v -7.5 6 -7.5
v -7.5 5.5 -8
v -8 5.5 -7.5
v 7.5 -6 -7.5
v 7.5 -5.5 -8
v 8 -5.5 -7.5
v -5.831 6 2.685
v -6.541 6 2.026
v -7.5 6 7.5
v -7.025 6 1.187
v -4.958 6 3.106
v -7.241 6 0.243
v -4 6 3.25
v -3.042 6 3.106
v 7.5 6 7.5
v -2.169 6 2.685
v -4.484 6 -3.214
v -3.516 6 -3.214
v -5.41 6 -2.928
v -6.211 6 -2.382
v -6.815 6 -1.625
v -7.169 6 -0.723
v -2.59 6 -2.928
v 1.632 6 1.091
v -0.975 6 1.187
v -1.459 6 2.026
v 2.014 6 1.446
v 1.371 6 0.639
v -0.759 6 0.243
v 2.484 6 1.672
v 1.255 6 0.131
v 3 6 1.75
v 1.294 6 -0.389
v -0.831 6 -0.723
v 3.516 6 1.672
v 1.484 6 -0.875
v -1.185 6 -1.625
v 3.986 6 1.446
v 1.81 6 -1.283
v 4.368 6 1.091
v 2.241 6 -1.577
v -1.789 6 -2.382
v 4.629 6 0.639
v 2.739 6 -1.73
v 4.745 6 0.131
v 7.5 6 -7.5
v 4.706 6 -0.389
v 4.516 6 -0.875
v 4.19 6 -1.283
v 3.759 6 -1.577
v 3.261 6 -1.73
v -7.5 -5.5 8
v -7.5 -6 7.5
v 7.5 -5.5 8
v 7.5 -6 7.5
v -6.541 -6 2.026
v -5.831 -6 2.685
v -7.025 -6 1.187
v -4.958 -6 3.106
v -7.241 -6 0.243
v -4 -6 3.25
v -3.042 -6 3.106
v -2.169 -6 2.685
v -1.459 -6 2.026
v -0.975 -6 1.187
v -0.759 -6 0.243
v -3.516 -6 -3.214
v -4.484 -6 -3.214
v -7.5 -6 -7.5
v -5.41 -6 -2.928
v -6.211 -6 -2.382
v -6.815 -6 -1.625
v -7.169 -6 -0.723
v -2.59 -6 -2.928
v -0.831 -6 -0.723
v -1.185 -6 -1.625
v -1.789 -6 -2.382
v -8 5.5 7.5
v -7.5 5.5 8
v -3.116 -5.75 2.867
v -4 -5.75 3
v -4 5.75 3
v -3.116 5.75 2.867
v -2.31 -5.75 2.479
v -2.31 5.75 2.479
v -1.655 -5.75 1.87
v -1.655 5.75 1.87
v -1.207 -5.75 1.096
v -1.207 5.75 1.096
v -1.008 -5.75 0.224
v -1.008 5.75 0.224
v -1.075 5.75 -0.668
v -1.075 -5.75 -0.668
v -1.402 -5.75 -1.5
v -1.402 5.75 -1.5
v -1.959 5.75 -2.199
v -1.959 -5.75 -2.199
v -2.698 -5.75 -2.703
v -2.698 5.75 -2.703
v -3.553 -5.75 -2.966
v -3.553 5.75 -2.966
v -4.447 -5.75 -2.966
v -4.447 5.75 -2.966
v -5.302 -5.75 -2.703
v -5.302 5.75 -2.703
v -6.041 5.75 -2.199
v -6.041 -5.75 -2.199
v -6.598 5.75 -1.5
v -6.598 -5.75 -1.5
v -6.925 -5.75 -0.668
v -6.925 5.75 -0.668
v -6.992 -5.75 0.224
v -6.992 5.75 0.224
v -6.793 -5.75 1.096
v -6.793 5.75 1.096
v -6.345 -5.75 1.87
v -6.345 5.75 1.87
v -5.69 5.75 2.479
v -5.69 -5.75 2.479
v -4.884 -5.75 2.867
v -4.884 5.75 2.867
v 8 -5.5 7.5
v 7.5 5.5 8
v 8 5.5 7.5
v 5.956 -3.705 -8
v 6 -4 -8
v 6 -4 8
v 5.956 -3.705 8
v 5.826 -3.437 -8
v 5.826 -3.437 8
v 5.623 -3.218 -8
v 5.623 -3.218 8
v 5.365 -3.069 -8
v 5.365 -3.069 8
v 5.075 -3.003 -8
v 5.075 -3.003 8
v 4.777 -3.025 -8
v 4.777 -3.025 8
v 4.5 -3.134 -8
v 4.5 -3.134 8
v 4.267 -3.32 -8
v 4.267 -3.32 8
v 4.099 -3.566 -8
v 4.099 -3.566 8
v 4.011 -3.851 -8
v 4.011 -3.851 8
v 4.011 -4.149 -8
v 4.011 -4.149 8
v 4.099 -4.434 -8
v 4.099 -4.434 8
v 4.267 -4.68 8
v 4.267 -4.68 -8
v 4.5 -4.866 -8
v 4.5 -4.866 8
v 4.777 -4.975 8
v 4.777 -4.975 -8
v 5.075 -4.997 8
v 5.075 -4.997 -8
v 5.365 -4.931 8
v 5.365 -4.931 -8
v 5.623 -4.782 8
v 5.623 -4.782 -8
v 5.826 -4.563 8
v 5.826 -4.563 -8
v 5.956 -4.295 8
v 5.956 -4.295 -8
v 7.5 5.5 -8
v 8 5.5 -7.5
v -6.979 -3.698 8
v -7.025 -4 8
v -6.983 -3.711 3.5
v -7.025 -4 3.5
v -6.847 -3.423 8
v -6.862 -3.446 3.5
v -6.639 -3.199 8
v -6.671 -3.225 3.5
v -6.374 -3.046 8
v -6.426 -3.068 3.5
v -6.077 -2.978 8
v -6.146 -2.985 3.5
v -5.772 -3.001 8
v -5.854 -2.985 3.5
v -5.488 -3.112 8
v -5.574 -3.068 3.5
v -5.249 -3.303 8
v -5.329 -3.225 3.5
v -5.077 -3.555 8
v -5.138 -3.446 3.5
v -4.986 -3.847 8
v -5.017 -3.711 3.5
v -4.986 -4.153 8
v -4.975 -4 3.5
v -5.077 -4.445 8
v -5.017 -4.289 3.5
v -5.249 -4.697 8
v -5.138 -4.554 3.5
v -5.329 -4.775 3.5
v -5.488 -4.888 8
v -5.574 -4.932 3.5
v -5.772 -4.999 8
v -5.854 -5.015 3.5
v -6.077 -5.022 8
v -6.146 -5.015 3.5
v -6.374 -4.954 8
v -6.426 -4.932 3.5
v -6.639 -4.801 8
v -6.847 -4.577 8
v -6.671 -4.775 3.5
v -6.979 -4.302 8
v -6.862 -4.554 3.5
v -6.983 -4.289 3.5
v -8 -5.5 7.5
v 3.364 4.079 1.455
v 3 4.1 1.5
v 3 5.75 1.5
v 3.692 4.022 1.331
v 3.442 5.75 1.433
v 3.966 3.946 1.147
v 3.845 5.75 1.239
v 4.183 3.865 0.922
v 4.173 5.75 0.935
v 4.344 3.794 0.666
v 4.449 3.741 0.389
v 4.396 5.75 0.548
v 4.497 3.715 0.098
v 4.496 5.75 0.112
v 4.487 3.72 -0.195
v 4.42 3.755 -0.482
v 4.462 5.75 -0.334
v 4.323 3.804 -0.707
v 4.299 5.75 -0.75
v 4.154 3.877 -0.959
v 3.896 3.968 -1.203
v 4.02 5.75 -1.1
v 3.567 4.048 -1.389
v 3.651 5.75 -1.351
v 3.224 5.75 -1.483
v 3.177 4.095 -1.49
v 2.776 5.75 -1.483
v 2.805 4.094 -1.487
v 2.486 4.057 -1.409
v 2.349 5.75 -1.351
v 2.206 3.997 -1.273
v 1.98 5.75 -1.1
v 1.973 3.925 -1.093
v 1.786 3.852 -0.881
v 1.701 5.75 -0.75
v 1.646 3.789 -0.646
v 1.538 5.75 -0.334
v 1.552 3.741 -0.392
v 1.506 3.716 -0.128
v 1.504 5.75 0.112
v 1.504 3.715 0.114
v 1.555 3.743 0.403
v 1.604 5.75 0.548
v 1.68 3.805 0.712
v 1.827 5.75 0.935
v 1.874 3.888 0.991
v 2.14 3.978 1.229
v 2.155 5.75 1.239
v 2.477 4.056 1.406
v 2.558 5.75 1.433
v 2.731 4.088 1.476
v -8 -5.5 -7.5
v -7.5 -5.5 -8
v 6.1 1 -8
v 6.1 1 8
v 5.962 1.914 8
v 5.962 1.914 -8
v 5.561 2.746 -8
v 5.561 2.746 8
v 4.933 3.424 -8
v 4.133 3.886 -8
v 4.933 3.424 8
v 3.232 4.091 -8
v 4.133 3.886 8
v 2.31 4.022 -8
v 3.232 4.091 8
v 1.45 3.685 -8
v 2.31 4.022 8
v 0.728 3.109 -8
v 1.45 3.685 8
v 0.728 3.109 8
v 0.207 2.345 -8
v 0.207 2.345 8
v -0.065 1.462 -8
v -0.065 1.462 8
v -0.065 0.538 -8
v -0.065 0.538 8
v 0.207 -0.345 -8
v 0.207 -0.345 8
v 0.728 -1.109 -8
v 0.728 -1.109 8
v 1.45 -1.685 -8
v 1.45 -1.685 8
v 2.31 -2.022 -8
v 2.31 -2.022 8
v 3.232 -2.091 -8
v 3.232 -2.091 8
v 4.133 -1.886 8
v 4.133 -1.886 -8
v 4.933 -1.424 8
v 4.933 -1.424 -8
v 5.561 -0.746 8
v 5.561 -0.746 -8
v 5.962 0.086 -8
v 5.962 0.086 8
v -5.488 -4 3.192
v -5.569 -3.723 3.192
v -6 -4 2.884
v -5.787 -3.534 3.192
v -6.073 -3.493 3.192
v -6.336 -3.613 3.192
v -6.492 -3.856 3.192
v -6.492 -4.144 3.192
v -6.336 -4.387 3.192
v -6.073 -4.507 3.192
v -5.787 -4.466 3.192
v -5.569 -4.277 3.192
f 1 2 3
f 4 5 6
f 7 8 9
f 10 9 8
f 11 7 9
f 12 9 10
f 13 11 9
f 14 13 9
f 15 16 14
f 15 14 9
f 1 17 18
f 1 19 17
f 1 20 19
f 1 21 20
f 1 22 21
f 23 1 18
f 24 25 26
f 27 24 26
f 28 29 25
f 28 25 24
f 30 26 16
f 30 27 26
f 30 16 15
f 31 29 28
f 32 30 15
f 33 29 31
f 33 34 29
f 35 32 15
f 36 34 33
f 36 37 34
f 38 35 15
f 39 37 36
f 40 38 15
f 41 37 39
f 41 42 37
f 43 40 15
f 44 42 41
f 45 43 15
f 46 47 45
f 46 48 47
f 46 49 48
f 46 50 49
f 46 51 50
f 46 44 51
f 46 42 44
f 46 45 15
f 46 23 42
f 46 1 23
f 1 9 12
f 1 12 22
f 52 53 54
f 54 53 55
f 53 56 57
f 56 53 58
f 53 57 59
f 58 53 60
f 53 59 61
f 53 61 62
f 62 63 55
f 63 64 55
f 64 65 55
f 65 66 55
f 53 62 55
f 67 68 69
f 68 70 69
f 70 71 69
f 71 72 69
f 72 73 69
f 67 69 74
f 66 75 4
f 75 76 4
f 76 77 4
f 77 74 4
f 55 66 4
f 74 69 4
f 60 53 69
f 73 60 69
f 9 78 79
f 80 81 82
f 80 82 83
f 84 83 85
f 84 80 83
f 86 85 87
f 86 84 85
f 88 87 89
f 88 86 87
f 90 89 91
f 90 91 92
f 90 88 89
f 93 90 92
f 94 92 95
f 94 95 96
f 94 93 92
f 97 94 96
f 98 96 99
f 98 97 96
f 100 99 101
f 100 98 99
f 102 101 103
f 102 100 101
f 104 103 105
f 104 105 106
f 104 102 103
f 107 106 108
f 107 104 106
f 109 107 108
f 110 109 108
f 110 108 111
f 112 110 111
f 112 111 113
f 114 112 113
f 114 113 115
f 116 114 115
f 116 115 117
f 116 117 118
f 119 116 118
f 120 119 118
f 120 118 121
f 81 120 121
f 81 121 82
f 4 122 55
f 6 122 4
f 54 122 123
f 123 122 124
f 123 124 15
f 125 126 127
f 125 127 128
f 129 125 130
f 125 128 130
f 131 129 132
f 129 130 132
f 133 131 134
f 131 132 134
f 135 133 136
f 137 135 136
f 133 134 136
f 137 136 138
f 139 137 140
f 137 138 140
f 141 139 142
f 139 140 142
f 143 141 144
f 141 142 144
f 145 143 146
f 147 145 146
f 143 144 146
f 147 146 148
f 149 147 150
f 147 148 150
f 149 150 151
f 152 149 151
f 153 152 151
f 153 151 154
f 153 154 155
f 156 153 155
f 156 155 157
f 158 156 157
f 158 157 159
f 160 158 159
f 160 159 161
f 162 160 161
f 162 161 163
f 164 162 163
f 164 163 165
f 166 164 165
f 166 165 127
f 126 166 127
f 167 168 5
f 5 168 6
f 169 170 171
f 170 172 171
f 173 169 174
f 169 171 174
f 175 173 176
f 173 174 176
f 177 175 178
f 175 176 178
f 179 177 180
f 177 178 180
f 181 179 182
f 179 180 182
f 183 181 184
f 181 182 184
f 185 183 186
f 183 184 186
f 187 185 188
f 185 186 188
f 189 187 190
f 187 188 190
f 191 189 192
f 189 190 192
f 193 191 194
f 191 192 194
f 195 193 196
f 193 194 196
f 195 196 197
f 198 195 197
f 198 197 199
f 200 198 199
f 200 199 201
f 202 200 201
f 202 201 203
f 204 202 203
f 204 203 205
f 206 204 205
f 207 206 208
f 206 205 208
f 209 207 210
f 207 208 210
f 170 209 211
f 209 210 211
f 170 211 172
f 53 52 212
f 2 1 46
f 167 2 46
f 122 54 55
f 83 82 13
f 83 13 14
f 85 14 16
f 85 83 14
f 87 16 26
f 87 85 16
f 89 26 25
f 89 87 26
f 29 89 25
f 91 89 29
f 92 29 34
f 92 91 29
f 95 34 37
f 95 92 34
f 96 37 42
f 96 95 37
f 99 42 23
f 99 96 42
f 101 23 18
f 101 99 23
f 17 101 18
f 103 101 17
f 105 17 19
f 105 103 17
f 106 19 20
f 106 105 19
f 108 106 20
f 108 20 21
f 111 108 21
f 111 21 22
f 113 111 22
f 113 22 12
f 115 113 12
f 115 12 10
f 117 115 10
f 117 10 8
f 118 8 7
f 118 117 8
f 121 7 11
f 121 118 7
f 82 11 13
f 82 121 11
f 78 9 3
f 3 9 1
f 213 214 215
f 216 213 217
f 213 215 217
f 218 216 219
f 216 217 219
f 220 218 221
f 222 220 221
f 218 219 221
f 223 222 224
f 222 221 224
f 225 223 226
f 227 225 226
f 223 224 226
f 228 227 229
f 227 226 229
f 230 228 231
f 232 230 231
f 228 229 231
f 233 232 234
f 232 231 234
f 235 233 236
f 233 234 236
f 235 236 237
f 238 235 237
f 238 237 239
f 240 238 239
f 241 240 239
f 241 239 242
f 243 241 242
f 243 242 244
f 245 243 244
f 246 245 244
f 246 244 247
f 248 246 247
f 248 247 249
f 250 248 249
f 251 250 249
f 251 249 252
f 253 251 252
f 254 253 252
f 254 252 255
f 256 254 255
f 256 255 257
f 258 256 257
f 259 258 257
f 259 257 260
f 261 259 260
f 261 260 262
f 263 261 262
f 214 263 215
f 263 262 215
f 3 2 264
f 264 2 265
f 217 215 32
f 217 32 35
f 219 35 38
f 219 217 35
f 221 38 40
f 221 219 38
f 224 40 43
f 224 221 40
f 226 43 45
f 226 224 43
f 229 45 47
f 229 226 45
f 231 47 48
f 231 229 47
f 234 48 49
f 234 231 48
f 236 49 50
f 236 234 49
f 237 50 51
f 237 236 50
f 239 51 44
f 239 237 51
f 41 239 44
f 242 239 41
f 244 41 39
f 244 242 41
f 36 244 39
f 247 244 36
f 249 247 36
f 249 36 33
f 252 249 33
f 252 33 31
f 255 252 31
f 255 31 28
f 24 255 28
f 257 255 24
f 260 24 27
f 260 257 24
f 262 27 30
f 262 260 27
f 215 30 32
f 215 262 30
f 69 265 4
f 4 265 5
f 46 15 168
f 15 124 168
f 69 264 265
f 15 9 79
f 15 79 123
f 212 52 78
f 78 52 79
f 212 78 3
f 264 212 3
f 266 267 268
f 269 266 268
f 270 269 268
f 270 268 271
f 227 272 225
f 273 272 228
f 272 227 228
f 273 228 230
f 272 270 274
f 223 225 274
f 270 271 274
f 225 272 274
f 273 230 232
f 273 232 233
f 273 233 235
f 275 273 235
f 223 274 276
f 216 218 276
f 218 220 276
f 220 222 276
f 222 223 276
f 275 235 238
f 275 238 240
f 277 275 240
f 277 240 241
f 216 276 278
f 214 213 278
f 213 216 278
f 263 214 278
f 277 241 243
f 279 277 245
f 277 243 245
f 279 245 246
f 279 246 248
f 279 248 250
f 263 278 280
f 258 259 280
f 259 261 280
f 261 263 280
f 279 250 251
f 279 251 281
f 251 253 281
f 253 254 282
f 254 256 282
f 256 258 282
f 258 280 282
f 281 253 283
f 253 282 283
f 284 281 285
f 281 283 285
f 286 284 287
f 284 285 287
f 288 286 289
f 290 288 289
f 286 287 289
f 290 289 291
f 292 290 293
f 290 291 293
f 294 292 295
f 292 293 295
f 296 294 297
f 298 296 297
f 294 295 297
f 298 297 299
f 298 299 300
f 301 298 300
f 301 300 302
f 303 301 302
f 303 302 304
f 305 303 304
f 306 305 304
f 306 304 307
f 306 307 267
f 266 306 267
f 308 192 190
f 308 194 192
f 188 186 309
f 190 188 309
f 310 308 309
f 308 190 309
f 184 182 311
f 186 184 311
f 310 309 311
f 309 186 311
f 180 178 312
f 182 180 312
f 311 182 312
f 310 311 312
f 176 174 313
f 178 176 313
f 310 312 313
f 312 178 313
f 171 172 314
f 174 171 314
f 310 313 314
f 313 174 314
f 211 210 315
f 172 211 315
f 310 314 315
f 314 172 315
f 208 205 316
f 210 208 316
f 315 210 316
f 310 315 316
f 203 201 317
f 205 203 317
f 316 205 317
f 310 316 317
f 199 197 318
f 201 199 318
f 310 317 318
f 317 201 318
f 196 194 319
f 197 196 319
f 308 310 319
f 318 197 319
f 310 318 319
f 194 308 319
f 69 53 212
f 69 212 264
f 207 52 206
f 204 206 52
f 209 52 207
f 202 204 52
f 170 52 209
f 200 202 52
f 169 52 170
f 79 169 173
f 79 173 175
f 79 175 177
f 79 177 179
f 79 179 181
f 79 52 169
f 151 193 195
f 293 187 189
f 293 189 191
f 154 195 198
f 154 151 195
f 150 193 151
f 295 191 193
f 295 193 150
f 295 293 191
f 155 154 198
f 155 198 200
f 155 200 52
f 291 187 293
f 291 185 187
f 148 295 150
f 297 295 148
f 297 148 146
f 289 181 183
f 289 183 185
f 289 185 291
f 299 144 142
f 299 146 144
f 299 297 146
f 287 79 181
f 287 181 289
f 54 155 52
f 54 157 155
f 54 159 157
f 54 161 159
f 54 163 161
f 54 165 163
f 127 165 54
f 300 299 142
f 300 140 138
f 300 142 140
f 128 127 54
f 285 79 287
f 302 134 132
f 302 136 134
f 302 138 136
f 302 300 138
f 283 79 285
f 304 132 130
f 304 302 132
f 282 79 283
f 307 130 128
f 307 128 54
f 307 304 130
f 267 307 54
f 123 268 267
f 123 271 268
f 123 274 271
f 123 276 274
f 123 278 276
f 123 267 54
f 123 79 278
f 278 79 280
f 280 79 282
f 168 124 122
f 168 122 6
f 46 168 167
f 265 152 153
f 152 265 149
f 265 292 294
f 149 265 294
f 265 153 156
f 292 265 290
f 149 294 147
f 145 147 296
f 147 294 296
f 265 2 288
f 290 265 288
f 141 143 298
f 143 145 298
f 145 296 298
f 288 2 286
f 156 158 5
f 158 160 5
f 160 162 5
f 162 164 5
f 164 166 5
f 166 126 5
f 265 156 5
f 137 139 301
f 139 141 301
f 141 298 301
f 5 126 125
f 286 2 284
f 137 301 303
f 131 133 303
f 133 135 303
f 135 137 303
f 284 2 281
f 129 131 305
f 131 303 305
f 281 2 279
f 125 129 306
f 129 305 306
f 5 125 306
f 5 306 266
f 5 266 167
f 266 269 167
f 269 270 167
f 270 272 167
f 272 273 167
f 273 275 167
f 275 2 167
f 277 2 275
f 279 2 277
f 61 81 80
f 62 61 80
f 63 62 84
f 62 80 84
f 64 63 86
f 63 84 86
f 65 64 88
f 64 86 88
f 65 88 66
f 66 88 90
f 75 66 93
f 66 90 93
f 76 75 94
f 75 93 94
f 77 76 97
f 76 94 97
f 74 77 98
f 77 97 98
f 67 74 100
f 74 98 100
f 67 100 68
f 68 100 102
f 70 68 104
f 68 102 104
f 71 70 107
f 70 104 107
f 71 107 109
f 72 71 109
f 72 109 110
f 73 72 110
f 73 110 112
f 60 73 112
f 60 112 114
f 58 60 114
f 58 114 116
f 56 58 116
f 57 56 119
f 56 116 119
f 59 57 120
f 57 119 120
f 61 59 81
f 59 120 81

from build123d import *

# Parameters (mm, degrees)
SKETCH1_W                          = 16
SKETCH1_H                          = 16
SKETCH1_R                          = 3
BOSS_EXTRUDE1_DEPTH                = 6
TAP_DRILL_FOR_M2_5X0_45_TAP1_D     = 2.05
TAP_DRILL_FOR_M2_5X0_45_TAP1_DEPTH = 4.5
TAP_DRILL_FOR_M2_5X0_45_TAP1_TIP   = 0.615882135
SKETCH5_R                          = 3.1
SKETCH5_R_2                        = 1
CUT_EXTRUDE1_DEPTH                 = 19.867962264
SKETCH6_R                          = 1.5
CUT_EXTRUDE2_DEPTH                 = 6
CHAMFER1_SIZE                      = 0.5
CHAMFER2_SIZE                      = 0.25


with BuildPart() as part:
    # Sketch1 → Boss-Extrude1 (new, symmetric)
    with BuildSketch(Plane(origin=(0, 0, 0), x_dir=(1, 0, 0), z_dir=(0, 1, 0))):
        Rectangle(SKETCH1_W, SKETCH1_H)
        with Locations(Location((-4, 0, 0), (0, 0, 270))):
            Circle(SKETCH1_R, mode=Mode.SUBTRACT)
    extrude(amount=BOSS_EXTRUDE1_DEPTH, both=True)

    # Tap Drill for M2.5x0.45 Tap1
    with Locations(Plane.XY.offset(8)):
        with Locations((-6, -4)):
            Hole(TAP_DRILL_FOR_M2_5X0_45_TAP1_D / 2, depth=TAP_DRILL_FOR_M2_5X0_45_TAP1_DEPTH)
            with Locations((0, 0, -(TAP_DRILL_FOR_M2_5X0_45_TAP1_DEPTH + TAP_DRILL_FOR_M2_5X0_45_TAP1_TIP / 2))):  # 118° drill point
                Cone(0, TAP_DRILL_FOR_M2_5X0_45_TAP1_D / 2, TAP_DRILL_FOR_M2_5X0_45_TAP1_TIP, mode=Mode.SUBTRACT)

    # Sketch5 → Cut-Extrude1 (cut, through all)
    with BuildSketch(Plane.XY.offset(8)):
        with Locations((3, 1)):
            Circle(SKETCH5_R)
        with Locations((5, -4)):
            Circle(SKETCH5_R_2)
    extrude(amount=-CUT_EXTRUDE1_DEPTH, mode=Mode.SUBTRACT)

    # Sketch6 → Cut-Extrude2 (cut)
    with BuildSketch(Plane(origin=(0, 6, 0), x_dir=(1, 0, 0), z_dir=(0, 1, 0))):
        with Locations(Location((3, 0, 0), (0, 0, 270))):
            Circle(SKETCH6_R)
    extrude(amount=-CUT_EXTRUDE2_DEPTH, mode=Mode.SUBTRACT)

    # Chamfer1
    chamfer1_edges = [part.edges().sort_by_distance(p)[0] for p in [
        (8, 6, 0),
        (8, 0, 8),
        (-8, 0, 8),
        (-8, 0, -8),
        (8, 0, -8),
        (0, 6, -8),
        (-8, 6, 0),
        (0, 6, 8),
        (0, -6, 8),
        (-8, -6, 0),
        (0, -6, -8),
        (8, -6, 0),
    ]]
    chamfer(chamfer1_edges, length=CHAMFER1_SIZE)

    # Chamfer2
    chamfer2_edges = [part.edges().sort_by_distance(p)[0] for p in [
        (3, 6, -1.5),
        (-4, 6, -3),
        (-4, -6, -3),
    ]]
    chamfer(chamfer2_edges, length=CHAMFER2_SIZE)


solid = part.part
